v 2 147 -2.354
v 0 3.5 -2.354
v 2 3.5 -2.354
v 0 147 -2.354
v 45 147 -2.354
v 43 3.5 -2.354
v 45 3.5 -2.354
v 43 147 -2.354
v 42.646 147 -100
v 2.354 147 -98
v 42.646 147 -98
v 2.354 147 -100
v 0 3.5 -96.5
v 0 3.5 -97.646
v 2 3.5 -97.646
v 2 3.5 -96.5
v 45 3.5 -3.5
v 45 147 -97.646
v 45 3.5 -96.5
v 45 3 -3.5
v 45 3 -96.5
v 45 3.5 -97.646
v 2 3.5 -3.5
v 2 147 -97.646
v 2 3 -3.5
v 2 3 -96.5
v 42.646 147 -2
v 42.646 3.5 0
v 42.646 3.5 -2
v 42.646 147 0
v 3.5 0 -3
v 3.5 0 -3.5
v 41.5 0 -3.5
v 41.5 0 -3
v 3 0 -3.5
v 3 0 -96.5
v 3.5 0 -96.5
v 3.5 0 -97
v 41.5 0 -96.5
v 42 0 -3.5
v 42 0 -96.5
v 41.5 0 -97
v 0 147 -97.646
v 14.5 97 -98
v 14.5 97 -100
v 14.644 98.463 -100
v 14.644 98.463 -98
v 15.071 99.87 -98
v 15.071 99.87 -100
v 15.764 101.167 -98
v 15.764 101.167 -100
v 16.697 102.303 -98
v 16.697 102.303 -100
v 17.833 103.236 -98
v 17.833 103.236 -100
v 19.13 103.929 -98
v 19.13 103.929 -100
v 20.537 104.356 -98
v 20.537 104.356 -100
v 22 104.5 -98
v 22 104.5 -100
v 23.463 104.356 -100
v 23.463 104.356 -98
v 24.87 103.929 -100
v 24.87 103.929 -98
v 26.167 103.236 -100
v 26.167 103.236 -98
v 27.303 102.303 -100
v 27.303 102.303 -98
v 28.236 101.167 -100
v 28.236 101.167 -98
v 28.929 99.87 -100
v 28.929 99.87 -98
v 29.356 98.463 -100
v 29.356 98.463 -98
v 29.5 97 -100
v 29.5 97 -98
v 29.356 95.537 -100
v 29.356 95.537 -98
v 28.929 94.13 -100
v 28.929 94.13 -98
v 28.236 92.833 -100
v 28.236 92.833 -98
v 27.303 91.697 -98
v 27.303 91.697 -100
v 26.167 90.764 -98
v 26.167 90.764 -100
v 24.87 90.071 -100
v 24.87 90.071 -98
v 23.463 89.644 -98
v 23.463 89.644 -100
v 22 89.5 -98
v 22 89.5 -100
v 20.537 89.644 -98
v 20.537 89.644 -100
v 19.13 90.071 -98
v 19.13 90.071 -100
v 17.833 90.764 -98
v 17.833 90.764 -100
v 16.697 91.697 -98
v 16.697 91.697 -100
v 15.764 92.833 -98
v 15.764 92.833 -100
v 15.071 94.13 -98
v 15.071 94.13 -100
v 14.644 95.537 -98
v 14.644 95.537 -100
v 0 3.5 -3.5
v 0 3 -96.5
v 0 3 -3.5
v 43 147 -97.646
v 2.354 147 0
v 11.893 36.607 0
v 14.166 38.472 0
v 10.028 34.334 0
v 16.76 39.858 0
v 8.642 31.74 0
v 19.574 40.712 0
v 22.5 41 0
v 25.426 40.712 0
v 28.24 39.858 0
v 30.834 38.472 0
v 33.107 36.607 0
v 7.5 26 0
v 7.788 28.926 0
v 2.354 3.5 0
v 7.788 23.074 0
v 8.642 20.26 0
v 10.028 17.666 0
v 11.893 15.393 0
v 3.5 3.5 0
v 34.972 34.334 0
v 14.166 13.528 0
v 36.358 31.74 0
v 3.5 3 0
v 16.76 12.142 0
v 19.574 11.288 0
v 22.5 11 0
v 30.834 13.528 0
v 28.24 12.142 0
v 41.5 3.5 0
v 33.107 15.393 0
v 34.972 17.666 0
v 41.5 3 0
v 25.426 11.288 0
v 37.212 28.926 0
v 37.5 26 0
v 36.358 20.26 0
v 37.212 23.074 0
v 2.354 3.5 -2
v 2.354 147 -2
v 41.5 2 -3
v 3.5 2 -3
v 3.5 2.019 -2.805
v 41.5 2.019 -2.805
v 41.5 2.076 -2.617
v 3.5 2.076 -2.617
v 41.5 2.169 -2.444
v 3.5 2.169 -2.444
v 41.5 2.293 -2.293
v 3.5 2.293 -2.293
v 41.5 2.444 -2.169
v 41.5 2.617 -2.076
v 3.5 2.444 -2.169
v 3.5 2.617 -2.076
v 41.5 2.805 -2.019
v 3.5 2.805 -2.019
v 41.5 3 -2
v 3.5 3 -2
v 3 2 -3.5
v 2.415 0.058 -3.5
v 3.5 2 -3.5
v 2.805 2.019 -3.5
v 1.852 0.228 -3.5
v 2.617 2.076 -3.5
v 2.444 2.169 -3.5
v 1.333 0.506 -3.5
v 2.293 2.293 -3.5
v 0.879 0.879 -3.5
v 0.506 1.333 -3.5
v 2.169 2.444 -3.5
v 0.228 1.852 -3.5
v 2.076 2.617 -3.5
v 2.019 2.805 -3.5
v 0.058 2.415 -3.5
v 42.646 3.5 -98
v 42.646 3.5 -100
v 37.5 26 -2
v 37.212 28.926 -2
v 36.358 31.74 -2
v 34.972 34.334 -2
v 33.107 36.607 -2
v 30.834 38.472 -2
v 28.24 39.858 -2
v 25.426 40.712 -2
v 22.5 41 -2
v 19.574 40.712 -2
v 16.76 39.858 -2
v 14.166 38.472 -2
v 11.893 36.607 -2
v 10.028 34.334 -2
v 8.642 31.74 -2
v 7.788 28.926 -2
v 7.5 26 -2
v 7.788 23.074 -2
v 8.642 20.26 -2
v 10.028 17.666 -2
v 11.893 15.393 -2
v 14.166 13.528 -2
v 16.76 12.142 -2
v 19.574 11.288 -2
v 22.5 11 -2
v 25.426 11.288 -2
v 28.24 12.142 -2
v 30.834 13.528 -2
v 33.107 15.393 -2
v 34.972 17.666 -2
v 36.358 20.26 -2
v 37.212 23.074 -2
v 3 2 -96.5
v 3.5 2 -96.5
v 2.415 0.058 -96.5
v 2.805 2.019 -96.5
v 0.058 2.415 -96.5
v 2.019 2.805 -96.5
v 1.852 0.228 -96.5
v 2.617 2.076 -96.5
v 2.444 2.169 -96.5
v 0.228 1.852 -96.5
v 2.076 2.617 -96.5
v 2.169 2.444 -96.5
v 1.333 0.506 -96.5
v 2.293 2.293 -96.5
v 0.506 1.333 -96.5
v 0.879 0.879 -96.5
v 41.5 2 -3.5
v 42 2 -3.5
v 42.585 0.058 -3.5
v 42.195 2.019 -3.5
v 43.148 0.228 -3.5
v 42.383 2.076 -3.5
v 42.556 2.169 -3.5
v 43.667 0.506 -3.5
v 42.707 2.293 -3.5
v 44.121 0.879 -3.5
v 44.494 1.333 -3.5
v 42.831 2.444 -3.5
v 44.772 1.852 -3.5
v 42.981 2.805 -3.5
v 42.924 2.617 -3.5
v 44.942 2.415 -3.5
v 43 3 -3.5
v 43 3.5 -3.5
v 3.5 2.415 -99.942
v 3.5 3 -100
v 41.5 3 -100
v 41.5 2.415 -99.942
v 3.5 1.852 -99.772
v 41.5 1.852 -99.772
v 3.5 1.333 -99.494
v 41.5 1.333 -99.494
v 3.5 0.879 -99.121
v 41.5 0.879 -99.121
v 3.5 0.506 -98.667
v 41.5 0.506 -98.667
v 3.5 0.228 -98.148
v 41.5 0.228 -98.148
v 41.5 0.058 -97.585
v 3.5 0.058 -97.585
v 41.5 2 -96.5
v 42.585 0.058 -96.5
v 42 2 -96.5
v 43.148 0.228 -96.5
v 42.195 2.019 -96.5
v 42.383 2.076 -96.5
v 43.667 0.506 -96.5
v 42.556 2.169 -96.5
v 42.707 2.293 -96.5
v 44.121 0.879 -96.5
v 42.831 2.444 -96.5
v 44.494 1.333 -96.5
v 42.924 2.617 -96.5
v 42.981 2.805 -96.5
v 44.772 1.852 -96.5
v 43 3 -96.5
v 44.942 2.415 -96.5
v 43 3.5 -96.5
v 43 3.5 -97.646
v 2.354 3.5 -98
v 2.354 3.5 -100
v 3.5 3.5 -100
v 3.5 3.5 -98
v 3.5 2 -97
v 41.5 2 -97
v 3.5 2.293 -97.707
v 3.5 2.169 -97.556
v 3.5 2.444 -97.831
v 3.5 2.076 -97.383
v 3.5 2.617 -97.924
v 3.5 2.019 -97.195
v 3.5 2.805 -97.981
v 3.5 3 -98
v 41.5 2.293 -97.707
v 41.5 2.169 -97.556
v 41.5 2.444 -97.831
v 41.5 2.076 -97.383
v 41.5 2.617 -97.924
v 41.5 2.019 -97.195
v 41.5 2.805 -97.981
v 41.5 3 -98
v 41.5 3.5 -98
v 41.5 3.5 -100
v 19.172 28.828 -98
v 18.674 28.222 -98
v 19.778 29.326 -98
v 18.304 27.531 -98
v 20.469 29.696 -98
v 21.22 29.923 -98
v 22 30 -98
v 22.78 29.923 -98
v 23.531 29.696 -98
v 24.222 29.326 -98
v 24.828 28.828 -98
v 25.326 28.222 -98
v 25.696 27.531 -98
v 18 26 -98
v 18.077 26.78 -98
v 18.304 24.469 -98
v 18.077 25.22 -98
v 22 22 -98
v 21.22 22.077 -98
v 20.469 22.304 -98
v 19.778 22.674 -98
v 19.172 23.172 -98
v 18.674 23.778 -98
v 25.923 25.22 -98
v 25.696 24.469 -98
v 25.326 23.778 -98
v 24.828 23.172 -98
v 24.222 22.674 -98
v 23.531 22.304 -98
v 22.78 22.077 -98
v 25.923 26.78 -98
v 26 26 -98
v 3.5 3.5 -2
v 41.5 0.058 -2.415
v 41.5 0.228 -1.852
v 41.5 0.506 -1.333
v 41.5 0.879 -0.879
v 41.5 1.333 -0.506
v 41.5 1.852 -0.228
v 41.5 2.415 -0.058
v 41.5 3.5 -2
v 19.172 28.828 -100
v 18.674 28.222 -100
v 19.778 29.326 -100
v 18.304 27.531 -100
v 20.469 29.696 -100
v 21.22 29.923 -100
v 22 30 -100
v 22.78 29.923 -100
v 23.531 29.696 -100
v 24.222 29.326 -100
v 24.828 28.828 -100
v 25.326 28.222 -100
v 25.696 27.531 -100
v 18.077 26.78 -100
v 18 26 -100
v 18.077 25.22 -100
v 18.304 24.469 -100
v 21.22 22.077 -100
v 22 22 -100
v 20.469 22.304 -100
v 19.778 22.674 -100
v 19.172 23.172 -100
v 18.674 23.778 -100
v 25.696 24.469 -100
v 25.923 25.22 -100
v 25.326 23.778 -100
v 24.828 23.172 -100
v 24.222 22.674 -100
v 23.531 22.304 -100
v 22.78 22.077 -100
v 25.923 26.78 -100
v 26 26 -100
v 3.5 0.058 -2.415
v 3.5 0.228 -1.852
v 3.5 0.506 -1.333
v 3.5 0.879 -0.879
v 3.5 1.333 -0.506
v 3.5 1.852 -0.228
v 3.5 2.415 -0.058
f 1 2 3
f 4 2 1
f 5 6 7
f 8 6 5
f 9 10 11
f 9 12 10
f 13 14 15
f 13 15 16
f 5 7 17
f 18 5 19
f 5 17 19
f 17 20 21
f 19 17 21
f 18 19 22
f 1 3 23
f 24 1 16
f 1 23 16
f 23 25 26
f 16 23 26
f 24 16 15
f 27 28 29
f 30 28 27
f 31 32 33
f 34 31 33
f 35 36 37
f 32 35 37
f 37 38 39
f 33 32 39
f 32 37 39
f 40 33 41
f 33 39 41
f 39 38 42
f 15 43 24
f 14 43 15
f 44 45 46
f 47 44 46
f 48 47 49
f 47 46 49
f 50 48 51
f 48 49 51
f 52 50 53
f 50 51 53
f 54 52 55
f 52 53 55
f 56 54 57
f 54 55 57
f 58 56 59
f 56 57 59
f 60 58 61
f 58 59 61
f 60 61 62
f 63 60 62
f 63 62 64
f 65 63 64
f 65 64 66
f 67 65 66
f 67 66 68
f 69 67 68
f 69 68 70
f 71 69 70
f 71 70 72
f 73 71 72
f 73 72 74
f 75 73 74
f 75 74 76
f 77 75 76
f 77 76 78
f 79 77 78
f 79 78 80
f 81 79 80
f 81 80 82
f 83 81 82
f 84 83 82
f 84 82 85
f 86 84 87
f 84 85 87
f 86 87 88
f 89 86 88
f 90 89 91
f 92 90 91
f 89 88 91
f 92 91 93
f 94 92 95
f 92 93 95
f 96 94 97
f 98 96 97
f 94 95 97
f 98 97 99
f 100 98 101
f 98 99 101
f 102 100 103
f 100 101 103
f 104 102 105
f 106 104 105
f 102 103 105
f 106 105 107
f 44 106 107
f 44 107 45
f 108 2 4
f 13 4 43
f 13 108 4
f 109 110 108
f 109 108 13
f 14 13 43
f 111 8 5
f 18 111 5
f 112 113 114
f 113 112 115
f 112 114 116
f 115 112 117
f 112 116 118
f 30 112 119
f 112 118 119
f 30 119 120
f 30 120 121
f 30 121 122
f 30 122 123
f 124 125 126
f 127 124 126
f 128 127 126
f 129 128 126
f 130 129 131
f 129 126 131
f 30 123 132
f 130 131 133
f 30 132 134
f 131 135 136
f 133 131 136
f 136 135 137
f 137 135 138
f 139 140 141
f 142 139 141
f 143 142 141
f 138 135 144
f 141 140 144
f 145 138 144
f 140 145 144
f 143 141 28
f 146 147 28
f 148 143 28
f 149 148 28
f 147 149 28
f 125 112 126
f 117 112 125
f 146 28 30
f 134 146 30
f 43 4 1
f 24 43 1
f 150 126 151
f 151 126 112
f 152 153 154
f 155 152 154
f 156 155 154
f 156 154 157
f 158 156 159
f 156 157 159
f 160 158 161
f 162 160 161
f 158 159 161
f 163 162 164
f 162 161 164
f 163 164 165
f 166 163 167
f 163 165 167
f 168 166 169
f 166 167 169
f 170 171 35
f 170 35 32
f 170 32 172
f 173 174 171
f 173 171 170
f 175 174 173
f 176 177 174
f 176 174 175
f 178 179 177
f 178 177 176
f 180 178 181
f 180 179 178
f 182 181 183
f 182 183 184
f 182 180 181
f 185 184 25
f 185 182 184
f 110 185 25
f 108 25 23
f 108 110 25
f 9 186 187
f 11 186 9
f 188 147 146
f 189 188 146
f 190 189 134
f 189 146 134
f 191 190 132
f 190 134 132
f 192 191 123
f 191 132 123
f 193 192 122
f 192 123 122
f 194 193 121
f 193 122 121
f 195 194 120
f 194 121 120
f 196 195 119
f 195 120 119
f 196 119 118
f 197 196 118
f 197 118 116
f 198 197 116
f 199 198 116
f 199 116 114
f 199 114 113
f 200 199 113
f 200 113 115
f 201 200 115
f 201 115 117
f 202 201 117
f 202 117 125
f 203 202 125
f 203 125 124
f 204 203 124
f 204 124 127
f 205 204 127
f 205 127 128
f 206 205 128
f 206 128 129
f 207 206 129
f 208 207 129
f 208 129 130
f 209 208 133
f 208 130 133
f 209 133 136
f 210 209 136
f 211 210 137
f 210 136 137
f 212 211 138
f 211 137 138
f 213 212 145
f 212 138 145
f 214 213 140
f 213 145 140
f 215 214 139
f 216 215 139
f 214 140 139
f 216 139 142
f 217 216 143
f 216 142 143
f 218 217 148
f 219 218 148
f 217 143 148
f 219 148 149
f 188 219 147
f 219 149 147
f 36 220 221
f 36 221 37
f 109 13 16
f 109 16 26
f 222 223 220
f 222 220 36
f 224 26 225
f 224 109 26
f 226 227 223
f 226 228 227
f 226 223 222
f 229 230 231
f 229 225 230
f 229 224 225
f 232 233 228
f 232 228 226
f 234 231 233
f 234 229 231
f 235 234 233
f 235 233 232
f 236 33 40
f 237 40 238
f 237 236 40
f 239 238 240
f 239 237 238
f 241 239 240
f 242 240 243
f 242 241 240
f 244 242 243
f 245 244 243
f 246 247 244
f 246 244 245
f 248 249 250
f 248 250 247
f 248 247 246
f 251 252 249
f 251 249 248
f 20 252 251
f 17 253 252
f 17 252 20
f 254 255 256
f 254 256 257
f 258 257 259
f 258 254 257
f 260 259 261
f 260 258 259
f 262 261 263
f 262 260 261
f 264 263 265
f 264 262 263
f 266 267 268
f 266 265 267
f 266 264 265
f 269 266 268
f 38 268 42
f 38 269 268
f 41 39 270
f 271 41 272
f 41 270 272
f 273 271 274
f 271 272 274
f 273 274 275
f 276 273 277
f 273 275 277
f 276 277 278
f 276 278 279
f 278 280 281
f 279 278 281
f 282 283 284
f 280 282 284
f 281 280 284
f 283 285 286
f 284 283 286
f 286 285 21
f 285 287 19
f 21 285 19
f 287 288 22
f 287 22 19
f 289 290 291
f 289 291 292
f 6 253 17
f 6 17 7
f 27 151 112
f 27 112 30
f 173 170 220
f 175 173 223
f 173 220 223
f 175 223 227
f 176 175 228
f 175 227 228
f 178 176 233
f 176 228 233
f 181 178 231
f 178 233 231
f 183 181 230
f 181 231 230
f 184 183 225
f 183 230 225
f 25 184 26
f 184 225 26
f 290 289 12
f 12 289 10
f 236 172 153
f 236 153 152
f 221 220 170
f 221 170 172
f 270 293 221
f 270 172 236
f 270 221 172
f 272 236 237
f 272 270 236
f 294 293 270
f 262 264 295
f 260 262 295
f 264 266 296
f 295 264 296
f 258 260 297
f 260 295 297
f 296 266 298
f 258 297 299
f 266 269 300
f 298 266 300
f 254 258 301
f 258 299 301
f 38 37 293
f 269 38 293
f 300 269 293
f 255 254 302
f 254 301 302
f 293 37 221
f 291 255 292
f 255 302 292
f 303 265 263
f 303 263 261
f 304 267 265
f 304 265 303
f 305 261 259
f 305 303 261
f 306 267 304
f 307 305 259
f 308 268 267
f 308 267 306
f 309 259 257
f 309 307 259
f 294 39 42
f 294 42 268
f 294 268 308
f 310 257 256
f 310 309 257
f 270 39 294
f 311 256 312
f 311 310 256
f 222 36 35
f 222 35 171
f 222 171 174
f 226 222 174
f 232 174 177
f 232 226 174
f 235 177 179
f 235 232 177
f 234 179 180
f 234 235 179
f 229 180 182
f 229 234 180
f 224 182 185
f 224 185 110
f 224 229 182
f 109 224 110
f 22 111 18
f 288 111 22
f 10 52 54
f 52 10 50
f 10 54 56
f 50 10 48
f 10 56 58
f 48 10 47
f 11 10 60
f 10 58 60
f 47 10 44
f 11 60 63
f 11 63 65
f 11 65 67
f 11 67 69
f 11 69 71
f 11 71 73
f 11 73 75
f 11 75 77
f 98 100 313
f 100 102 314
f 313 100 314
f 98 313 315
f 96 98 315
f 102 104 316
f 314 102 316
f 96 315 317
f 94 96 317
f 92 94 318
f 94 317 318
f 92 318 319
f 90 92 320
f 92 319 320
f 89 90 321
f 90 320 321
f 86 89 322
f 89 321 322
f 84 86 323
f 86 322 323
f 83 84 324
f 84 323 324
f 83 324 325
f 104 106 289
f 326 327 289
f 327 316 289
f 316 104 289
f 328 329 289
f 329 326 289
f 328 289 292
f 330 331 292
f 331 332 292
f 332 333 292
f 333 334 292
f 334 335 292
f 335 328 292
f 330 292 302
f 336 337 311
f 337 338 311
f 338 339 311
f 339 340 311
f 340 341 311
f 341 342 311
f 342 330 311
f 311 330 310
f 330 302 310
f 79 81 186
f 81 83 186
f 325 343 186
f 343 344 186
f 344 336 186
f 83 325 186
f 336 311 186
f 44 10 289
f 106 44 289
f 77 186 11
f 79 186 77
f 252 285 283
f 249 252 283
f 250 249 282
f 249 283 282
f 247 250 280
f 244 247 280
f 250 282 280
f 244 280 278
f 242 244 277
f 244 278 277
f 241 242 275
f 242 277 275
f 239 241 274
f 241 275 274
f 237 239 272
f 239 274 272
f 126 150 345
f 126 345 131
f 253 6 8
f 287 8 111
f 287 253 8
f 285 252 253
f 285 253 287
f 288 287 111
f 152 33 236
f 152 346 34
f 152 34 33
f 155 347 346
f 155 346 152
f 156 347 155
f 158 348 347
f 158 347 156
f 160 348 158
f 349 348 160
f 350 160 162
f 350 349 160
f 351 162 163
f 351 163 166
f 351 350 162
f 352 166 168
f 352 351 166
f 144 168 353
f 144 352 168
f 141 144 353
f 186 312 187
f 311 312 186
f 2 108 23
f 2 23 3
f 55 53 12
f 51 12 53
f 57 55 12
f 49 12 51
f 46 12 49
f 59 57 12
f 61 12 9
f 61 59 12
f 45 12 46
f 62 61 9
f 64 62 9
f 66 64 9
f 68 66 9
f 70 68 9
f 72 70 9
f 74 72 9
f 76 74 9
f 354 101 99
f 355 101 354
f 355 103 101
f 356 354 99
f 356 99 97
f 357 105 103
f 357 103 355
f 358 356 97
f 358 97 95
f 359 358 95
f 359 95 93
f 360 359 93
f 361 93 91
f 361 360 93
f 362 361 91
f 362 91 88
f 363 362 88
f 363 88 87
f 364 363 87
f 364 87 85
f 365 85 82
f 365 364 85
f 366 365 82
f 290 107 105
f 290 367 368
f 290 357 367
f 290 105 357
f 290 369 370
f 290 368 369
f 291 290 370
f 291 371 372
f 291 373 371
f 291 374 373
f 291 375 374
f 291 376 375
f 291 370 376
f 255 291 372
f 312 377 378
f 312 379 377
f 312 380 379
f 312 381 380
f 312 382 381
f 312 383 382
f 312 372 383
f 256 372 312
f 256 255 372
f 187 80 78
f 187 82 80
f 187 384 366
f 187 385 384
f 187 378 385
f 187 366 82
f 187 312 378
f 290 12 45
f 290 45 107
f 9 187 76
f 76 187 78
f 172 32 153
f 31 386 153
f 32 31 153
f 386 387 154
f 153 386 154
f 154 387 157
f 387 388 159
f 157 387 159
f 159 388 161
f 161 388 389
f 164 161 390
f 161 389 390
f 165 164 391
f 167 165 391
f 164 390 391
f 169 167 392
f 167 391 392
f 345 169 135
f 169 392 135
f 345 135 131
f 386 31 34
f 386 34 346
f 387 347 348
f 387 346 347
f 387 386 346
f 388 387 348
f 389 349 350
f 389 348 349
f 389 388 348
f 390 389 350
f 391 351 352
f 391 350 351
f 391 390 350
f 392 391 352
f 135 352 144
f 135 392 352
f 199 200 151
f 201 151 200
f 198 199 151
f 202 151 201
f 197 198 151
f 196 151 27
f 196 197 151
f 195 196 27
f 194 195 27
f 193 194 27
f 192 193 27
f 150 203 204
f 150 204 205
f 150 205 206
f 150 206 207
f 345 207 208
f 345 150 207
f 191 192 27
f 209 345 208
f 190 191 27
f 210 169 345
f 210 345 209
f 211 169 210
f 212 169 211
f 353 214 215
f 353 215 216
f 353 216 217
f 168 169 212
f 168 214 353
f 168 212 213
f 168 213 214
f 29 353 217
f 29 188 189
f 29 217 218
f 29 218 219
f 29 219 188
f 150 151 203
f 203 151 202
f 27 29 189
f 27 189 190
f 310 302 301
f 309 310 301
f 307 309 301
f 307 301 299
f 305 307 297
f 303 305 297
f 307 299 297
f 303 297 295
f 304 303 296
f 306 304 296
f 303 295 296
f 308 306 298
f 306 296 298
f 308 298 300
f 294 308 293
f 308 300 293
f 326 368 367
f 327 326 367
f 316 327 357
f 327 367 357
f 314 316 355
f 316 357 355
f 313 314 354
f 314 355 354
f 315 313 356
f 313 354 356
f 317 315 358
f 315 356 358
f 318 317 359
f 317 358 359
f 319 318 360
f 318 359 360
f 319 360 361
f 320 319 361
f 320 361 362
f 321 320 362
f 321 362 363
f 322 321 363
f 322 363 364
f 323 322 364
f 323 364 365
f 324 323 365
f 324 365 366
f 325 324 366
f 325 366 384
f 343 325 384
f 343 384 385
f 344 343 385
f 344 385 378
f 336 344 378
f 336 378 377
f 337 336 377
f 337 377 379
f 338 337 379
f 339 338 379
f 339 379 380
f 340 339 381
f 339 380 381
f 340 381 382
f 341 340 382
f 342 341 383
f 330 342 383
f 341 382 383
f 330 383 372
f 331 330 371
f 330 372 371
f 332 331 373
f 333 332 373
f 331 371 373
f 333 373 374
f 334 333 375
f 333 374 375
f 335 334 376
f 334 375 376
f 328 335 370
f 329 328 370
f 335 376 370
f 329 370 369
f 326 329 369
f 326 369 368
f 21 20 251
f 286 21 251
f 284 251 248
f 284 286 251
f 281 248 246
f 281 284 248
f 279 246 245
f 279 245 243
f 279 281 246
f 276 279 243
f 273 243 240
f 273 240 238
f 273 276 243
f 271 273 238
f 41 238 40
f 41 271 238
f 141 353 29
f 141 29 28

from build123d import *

# Parameters (mm, degrees)
SKETCH7_W              = 45
SKETCH7_H              = 100
BOSS_EXTRUDE1_DEPTH    = 147
SHELL1_T               = -2
CONVERT_SOLID1_START   = -1
CONVERT_SOLID1_DEPTH   = 3.353553391
CONVERT_SOLID1_START_2 = 42.646446609
CONVERT_SOLID1_2_DEPTH = 3.353553391
CONVERT_SOLID1_START_3 = 2.353553391
CONVERT_SOLID1_3_DEPTH = 40.292893218
CONVERT_SOLID1_4_DEPTH = 1.146446609
CONVERT_SOLID1_START_4 = 41.5
CONVERT_SOLID1_5_DEPTH = 1.146446609
CONVERT_SOLID1_START_5 = 3.5
CONVERT_SOLID1_6_DEPTH = 38
CONVERT_SOLID1_START_6 = -96.5
CONVERT_SOLID1_7_DEPTH = 93
CONVERT_SOLID1_8_DEPTH = 93
SKETCH13_R             = 15
CUT_EXTRUDE1_DEPTH     = 10
SKETCH14_R             = 4
CUT_EXTRUDE2_DEPTH     = 10
SKETCH15_R             = 7.5
CUT_EXTRUDE3_DEPTH     = 10


with BuildPart() as part:
    # Sketch7 → Boss-Extrude1 (new body)
    with BuildSketch(Plane(origin=(0, 0, 0), x_dir=(1, 0, 0), z_dir=(0, 1, 0))):
        with Locations((22.5, 50)):
            Rectangle(SKETCH7_W, SKETCH7_H)
    extrude(amount=BOSS_EXTRUDE1_DEPTH)

    # Shell1
    shell1_openings = [part.faces().sort_by_distance(p)[0] for p in [
        (22.5, 147, -50),
    ]]
    offset(amount=SHELL1_T, openings=shell1_openings, kind=Kind.INTERSECTION)

    # Convert-Solid1: read off the stored shape, not the designer's step
    # Convert-Solid1 outline → Convert-Solid1 (cut)
    with BuildSketch(Plane.YZ.offset(CONVERT_SOLID1_START)):
        Polygon((147, -100), (147, -97.646446609), (3.5, -97.646446609), (3.5, -96.5), (0, -96.5), (0, -100), align=None)
        Polygon((147, -2.353553391), (147, 0), (0, 0), (0, -3.5), (3.5, -3.5), (3.5, -2.353553391), align=None)
    extrude(amount=CONVERT_SOLID1_DEPTH, mode=Mode.SUBTRACT)

    # Convert-Solid1 2 outline → Convert-Solid1 2 (cut)
    with BuildSketch(Plane.YZ.offset(CONVERT_SOLID1_START_2)):
        Polygon((147, -100), (147, -97.646446609), (3.5, -97.646446609), (3.5, -96.5), (0, -96.5), (0, -100), align=None)
        Polygon((147, -2.353553391), (147, 0), (0, 0), (0, -3.5), (3.5, -3.5), (3.5, -2.353553391), align=None)
    extrude(amount=CONVERT_SOLID1_2_DEPTH, mode=Mode.SUBTRACT)

    # Convert-Solid1 3 outline → Convert-Solid1 3 (cut)
    with BuildSketch(Plane.YZ.offset(CONVERT_SOLID1_START_3)):
        with BuildLine():
            ThreePointArc((3, -100), (0.878679656, -99.121320344), (0, -97))
            Line((0, -97), (0, -100))
            Line((0, -100), (3, -100))
        make_face()
        with BuildLine():
            Line((0, 0), (0, -3))
            ThreePointArc((0, -3), (0.878679656, -0.878679656), (3, 0))
            Line((3, 0), (0, 0))
        make_face()
    extrude(amount=CONVERT_SOLID1_3_DEPTH, mode=Mode.SUBTRACT)

    # Convert-Solid1 4 outline → Convert-Solid1 4 (cut)
    with BuildSketch(Plane.YZ.offset(CONVERT_SOLID1_START_3)):
        with BuildLine():
            Line((2, -98), (2, -96.5))
            Line((2, -96.5), (0, -96.5))
            Line((0, -96.5), (0, -97))
            ThreePointArc((0, -97), (0.878679656, -99.121320344), (3, -100))
            Line((3, -100), (3.5, -100))
            Line((3.5, -100), (3.5, -98))
            Line((3.5, -98), (2, -98))
        make_face()
        with BuildLine():
            Line((0, -3.5), (2, -3.5))
            Line((2, -3.5), (2, -2))
            Line((2, -2), (3.5, -2))
            Line((3.5, -2), (3.5, 0))
            Line((3.5, 0), (3, 0))
            ThreePointArc((3, 0), (0.878679656, -0.878679656), (0, -3))
            Line((0, -3), (0, -3.5))
        make_face()
    extrude(amount=CONVERT_SOLID1_4_DEPTH, mode=Mode.SUBTRACT)

    # Convert-Solid1 5 outline → Convert-Solid1 5 (cut)
    with BuildSketch(Plane.YZ.offset(CONVERT_SOLID1_START_4)):
        with BuildLine():
            Line((2, -98), (2, -96.5))
            Line((2, -96.5), (0, -96.5))
            Line((0, -96.5), (0, -97))
            ThreePointArc((0, -97), (0.878679656, -99.121320344), (3, -100))
            Line((3, -100), (3.5, -100))
            Line((3.5, -100), (3.5, -98))
            Line((3.5, -98), (2, -98))
        make_face()
        with BuildLine():
            Line((0, -3.5), (2, -3.5))
            Line((2, -3.5), (2, -2))
            Line((2, -2), (3.5, -2))
            Line((3.5, -2), (3.5, 0))
            Line((3.5, 0), (3, 0))
            ThreePointArc((3, 0), (0.878679656, -0.878679656), (0, -3))
            Line((0, -3), (0, -3.5))
        make_face()
    extrude(amount=CONVERT_SOLID1_5_DEPTH, mode=Mode.SUBTRACT)

    # Convert-Solid1 6 outline → Convert-Solid1 6 (add)
    with BuildSketch(Plane.YZ.offset(CONVERT_SOLID1_START_5)):
        with BuildLine():
            ThreePointArc((3, -98), (2.292893219, -97.707106781), (2, -97))
            Line((2, -97), (2, -98))
            Line((2, -98), (3, -98))
        make_face()
        with BuildLine():
            Line((2, -2), (2, -3))
            ThreePointArc((2, -3), (2.292893219, -2.292893219), (3, -2))
            Line((3, -2), (2, -2))
        make_face()
    extrude(amount=CONVERT_SOLID1_6_DEPTH)

    # Convert-Solid1 7 outline → Convert-Solid1 7 (cut)
    with BuildSketch(Plane.XY.offset(CONVERT_SOLID1_START_6)):
        with BuildLine():
            Line((45, 0), (45, 3))
            ThreePointArc((45, 3), (44.121320344, 0.878679656), (42, 0))
            Line((42, 0), (45, 0))
        make_face()
        with BuildLine():
            Line((0, 0), (3, 0))
            ThreePointArc((3, 0), (0.878679656, 0.878679656), (0, 3))
            Line((0, 3), (0, 0))
        make_face()
    extrude(amount=CONVERT_SOLID1_7_DEPTH, mode=Mode.SUBTRACT)

    # Convert-Solid1 8 outline → Convert-Solid1 8 (add)
    with BuildSketch(Plane.XY.offset(CONVERT_SOLID1_START_6)):
        with BuildLine():
            Line((43, 2), (43, 3))
            ThreePointArc((43, 3), (42.707106781, 2.292893219), (42, 2))
            Line((42, 2), (43, 2))
        make_face()
        with BuildLine():
            Line((2, 2), (3, 2))
            ThreePointArc((3, 2), (2.292893219, 2.292893219), (2, 3))
            Line((2, 3), (2, 2))
        make_face()
    extrude(amount=CONVERT_SOLID1_8_DEPTH)

    # Sketch13 → Cut-Extrude1 (cut)
    with BuildSketch(Plane.XY):
        with Locations((22.5, 26)):
            Circle(SKETCH13_R)
    extrude(amount=-CUT_EXTRUDE1_DEPTH, mode=Mode.SUBTRACT)

    # Sketch14 → Cut-Extrude2 (cut)
    with BuildSketch(Plane(origin=(0, 0, -100), x_dir=(-1, 0, 0), z_dir=(0, 0, -1))):
        with Locations((-22, 26)):
            Circle(SKETCH14_R)
    extrude(amount=-CUT_EXTRUDE2_DEPTH, mode=Mode.SUBTRACT)

    # Sketch15 → Cut-Extrude3 (cut)
    with BuildSketch(Plane(origin=(0, 0, -100), x_dir=(-1, 0, 0), z_dir=(0, 0, -1))):
        with Locations((-22, 97)):
            Circle(SKETCH15_R)
    extrude(amount=-CUT_EXTRUDE3_DEPTH, mode=Mode.SUBTRACT)


solid = part.part
